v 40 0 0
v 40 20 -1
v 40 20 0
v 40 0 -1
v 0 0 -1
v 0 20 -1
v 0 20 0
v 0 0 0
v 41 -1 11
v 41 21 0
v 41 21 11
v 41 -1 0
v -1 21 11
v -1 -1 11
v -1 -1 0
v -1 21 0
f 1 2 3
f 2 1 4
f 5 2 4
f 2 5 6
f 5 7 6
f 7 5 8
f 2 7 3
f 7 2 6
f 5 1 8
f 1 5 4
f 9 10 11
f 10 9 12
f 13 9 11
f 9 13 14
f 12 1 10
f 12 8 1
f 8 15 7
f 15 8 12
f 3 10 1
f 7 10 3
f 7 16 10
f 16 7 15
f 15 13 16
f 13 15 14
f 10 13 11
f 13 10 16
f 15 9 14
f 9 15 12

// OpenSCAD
// Unit of length: Unit.MM
union()
{
   color(c = [1.0, 0.0, 0.0, 1.0])
   {
      translate(v = [0.0, 0.0, -1.0])
      {
         cube(size = [40.0, 20.0, 11.0], center = false);
      }
   }
   translate(v = [-1.0, -1.0, 0.0])
   {
      cube(size = [42.0, 22.0, 11.0], center = false);
   }
}
